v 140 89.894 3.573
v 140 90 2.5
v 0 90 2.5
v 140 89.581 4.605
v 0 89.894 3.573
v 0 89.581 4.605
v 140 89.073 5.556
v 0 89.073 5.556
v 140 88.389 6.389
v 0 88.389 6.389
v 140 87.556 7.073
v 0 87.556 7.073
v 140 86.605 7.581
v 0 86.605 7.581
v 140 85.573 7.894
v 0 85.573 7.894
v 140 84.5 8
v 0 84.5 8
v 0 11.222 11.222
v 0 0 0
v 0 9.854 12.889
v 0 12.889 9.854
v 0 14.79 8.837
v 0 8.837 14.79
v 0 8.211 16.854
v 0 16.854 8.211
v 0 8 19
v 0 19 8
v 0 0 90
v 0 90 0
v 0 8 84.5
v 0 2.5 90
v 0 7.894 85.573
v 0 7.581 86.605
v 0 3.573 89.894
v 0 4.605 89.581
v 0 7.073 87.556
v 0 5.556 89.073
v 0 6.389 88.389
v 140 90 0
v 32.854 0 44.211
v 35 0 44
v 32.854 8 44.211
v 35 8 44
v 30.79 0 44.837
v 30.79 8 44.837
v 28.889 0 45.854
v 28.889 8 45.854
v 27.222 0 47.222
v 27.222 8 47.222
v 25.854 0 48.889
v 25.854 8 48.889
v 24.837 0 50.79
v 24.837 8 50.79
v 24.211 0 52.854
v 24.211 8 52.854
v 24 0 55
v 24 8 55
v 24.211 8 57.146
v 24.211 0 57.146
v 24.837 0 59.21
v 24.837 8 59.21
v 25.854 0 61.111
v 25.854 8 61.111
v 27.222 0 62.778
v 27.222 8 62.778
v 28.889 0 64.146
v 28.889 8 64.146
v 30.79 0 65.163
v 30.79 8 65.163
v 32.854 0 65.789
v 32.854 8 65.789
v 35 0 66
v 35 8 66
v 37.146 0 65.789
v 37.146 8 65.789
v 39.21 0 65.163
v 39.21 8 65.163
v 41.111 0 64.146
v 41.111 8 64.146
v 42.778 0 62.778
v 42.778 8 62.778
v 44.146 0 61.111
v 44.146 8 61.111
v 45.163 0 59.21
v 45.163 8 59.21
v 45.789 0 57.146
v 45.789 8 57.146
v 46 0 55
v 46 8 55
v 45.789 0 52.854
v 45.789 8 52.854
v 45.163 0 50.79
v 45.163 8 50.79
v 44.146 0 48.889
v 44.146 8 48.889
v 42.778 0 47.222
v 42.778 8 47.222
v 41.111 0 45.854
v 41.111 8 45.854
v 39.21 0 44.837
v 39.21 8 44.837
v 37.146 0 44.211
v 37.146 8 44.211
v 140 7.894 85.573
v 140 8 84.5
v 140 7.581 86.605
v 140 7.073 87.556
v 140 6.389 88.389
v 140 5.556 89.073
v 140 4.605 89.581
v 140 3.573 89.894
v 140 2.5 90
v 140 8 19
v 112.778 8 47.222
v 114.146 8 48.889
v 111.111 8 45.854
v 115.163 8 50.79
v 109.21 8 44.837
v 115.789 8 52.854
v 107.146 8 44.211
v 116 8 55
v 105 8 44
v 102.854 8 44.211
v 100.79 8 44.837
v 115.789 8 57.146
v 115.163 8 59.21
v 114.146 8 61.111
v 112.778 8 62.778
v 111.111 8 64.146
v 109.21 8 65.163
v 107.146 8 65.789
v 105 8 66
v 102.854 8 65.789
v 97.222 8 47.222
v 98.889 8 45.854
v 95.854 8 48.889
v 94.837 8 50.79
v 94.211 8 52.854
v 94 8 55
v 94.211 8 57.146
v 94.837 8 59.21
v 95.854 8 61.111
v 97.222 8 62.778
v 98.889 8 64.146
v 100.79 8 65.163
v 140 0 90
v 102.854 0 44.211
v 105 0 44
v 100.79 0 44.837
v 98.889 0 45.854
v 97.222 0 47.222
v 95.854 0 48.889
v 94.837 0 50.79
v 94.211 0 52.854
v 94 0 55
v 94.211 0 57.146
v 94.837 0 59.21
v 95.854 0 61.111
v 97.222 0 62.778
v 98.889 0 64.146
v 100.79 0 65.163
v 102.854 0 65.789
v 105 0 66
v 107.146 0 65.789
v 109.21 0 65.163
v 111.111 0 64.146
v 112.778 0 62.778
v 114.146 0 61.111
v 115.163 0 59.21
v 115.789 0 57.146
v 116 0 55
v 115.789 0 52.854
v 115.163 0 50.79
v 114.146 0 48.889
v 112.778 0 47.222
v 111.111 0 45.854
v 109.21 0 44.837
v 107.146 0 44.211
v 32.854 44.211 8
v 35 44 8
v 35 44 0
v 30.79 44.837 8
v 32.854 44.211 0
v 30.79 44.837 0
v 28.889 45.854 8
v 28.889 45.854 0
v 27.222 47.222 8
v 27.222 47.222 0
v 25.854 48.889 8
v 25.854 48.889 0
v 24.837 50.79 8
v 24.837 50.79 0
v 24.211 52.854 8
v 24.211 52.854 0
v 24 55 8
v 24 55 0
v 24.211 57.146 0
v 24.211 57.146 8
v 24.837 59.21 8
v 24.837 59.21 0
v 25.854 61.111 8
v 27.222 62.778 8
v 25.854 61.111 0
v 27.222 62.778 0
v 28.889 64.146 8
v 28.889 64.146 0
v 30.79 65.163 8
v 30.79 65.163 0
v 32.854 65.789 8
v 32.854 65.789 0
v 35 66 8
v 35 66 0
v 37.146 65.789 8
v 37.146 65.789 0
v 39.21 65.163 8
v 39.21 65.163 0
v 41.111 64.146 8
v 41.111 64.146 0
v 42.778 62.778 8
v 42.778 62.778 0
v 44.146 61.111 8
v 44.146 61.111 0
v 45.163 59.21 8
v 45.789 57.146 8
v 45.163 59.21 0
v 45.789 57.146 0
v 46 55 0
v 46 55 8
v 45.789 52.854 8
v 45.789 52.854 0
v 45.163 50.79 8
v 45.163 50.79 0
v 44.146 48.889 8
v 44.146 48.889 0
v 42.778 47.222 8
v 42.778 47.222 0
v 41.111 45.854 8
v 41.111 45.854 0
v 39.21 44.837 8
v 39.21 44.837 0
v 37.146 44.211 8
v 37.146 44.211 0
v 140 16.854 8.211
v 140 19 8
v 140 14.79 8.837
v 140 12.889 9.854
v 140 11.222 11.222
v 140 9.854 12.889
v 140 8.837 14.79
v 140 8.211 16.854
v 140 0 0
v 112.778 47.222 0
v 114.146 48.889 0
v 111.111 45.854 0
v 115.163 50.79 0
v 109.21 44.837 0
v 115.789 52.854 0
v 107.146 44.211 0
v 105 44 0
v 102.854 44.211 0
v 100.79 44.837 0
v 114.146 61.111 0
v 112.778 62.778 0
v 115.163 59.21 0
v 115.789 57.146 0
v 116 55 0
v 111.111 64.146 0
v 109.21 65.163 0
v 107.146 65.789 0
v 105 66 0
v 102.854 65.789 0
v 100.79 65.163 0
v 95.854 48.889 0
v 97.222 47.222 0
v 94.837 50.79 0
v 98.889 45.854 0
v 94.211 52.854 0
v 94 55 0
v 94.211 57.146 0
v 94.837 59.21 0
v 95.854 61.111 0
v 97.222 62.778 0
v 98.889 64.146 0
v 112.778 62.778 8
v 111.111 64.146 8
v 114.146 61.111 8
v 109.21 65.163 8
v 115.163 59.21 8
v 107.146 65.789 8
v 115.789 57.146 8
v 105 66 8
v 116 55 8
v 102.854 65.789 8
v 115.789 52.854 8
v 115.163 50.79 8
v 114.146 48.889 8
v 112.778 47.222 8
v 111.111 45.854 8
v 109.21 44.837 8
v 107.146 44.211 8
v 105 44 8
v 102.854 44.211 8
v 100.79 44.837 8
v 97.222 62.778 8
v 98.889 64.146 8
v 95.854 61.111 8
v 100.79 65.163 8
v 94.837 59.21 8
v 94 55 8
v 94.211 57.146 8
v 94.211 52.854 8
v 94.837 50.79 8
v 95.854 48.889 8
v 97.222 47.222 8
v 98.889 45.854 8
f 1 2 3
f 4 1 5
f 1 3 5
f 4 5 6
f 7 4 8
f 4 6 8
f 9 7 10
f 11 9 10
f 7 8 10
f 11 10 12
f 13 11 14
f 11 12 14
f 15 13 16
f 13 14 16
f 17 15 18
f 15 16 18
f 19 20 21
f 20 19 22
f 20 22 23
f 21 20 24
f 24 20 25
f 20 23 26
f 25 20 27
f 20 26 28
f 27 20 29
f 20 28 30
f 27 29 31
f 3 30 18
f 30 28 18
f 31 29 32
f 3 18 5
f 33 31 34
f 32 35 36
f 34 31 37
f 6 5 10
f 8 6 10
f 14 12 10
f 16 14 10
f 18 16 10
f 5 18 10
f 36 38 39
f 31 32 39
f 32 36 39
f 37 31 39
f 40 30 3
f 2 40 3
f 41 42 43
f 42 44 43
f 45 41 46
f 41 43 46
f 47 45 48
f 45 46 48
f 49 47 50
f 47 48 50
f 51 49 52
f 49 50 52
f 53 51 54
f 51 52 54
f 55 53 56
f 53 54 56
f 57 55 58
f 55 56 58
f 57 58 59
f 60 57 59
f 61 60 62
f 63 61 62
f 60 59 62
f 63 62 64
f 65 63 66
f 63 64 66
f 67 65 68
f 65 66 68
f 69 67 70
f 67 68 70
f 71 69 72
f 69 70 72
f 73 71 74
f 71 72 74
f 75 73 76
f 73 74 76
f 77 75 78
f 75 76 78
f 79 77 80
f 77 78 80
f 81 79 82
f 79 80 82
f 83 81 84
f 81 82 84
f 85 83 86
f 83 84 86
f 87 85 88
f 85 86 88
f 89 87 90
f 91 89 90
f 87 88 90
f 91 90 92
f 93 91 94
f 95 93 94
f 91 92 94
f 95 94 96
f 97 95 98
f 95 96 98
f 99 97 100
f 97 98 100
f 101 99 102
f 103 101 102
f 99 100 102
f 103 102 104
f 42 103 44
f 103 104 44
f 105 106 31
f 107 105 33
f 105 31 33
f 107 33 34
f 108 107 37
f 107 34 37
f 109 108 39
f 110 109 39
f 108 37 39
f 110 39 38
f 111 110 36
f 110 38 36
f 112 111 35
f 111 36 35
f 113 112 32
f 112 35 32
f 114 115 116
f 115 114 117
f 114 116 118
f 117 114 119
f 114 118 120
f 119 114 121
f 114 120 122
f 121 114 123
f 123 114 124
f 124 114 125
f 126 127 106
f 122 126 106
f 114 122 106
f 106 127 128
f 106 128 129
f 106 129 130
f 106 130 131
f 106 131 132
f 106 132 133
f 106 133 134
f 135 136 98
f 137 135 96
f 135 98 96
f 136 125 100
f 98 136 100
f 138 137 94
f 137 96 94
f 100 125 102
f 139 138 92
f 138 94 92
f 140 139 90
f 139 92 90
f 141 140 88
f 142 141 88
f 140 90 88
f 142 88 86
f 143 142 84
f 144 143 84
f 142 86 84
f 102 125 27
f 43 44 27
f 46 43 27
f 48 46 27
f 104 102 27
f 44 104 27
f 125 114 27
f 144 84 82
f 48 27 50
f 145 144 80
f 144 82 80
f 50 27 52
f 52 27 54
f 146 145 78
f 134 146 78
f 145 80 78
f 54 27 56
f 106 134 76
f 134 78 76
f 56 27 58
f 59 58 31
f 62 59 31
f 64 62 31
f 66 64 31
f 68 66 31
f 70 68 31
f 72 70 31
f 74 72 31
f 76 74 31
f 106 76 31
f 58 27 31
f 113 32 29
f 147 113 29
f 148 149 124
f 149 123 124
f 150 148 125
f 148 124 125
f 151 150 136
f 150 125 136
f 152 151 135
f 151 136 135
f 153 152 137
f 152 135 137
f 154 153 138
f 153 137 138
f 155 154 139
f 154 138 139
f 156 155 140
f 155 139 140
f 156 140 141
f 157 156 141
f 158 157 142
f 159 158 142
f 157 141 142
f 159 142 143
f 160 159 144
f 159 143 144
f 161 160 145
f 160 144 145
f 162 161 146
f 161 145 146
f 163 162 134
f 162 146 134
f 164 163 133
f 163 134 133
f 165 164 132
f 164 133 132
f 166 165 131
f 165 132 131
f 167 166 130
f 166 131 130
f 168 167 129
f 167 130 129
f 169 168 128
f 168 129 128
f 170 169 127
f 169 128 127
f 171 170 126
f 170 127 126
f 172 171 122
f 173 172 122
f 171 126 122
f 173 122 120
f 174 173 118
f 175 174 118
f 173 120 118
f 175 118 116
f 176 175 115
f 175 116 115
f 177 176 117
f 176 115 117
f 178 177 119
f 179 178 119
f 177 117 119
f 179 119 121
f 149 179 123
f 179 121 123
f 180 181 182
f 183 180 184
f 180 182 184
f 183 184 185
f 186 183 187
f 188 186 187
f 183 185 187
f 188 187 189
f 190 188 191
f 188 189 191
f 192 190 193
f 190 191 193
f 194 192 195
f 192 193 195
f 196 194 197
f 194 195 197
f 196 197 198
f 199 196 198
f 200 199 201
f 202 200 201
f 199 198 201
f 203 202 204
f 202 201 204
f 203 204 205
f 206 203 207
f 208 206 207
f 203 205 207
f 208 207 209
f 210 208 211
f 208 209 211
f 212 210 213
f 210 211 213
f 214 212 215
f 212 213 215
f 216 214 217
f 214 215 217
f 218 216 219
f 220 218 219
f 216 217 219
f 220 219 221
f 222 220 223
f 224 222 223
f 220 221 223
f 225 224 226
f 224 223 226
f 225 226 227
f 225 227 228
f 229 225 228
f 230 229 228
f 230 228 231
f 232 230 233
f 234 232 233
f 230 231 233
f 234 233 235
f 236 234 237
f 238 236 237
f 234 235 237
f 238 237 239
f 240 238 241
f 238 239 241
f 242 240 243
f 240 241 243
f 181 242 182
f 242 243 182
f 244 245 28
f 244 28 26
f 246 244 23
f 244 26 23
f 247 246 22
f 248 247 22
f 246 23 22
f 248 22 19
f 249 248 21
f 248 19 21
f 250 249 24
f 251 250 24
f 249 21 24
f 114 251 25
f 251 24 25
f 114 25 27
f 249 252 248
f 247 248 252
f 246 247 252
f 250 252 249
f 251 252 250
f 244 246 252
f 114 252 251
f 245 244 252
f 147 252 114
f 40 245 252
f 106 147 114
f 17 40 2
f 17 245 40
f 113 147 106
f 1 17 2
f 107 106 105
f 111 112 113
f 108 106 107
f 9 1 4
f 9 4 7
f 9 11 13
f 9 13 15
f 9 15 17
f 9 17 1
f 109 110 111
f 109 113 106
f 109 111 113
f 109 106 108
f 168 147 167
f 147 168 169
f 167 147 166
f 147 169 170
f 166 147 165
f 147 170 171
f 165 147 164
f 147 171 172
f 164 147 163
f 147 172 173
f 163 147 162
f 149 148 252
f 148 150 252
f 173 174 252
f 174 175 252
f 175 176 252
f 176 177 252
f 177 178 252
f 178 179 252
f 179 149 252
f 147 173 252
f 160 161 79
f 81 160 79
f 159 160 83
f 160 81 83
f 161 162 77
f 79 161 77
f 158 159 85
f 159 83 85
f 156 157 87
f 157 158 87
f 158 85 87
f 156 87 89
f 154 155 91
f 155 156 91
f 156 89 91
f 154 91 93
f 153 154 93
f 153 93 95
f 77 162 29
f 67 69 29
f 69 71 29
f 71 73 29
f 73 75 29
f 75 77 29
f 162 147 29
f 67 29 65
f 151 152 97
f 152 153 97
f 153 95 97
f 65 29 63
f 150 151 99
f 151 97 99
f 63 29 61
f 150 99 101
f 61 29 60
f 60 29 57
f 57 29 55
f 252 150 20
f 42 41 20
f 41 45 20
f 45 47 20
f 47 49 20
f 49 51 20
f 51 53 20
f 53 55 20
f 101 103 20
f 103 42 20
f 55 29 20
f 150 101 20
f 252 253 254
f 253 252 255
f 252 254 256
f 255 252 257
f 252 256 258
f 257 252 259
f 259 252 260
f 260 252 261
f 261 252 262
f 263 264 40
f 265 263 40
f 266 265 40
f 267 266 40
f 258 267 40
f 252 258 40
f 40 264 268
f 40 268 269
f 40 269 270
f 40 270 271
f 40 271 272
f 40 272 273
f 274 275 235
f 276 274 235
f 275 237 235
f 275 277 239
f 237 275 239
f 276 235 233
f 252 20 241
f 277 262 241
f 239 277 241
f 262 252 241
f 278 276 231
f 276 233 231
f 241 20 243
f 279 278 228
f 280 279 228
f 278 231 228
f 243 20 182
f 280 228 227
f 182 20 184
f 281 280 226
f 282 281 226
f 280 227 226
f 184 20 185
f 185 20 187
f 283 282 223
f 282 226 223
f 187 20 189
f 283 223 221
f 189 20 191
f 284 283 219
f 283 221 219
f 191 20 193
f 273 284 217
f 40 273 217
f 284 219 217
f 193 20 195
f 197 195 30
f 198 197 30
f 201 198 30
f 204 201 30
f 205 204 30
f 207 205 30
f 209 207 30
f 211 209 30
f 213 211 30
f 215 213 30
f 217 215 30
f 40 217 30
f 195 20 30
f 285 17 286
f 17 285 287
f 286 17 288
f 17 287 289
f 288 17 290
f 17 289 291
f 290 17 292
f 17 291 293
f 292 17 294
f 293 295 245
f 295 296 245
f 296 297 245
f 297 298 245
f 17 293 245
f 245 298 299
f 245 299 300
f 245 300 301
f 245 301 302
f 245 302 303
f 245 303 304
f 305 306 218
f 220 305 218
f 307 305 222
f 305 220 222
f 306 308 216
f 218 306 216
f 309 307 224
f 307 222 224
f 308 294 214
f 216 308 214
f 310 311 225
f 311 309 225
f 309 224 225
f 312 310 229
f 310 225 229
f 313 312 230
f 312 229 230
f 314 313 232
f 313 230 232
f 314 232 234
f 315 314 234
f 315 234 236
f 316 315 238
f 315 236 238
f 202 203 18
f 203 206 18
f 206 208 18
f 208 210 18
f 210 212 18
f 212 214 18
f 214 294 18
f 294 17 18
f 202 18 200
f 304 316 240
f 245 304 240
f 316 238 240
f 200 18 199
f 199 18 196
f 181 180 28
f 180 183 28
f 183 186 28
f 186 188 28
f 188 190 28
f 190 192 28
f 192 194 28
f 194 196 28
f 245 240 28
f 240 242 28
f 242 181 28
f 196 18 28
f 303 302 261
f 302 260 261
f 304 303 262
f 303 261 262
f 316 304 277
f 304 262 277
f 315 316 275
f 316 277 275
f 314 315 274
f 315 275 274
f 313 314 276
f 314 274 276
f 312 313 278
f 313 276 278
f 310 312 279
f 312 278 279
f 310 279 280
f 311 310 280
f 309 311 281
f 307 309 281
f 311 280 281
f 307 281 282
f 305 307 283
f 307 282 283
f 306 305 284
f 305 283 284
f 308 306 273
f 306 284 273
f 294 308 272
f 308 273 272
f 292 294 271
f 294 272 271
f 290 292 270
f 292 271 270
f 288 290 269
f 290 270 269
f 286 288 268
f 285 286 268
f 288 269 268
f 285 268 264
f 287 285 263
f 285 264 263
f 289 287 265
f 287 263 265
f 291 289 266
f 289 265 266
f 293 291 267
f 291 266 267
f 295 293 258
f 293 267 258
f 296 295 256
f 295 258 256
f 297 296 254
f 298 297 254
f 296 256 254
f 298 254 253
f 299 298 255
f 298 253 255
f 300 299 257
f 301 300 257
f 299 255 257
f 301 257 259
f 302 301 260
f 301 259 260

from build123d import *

# Parameters (mm, degrees)
ANGLES_EQUAL_90_X_90_X_8_1_DEPTH = 140
SKETCH12_R                       = 11
CUT_EXTRUDE1_DEPTH               = 190.208879284
LPATTERN1_COUNT                  = 2
LPATTERN1_PITCH                  = 70
CIRPATTERN4_COUNT                = 2
CIRPATTERN4_ANGLE                = 90
CIRPATTERN4_COPY_1_SKETCH_R      = 11
CIRPATTERN4_COPY_1_DEPTH         = 190.208879284


with BuildPart() as part:
    # Sketch11 → Angles equal 90 X 90 X 8(1) (new body)
    with BuildSketch(Plane(origin=(0, 45, 45), x_dir=(0, 1, 0), z_dir=(1, 0, 0))):
        with BuildLine():
            Line((-45, 45), (-45, -45))
            Line((-45, -45), (45, -45))
            Line((45, -45), (45, -42.5))
            ThreePointArc((45, -42.5), (43.389087297, -38.610912703), (39.5, -37))
            Line((39.5, -37), (-26, -37))
            ThreePointArc((-26, -37), (-33.778174593, -33.778174593), (-37, -26))
            Line((-37, -26), (-37, 39.5))
            ThreePointArc((-37, 39.5), (-38.610912703, 43.389087297), (-42.5, 45))
            Line((-42.5, 45), (-45, 45))
        make_face()
    extrude(amount=ANGLES_EQUAL_90_X_90_X_8_1_DEPTH)

    # Sketch12 → Cut-Extrude1 (cut, symmetric)
    with BuildSketch(Plane(origin=(0, 0, 0), x_dir=(1, 0, 0), z_dir=(0, 1, 0))):
        with Locations(Location((35, -55, 0), (0, 0, 90))):
            Circle(SKETCH12_R)
    cut_extrude1 = extrude(amount=CUT_EXTRUDE1_DEPTH, both=True, mode=Mode.SUBTRACT)

    # LPattern1: Cut-Extrude1 ×2
    with Locations(*[(i * LPATTERN1_PITCH, 0, 0) for i in range(1, LPATTERN1_COUNT)]):
        add(cut_extrude1, mode=Mode.SUBTRACT)

    # CirPattern4: Cut-Extrude1 ×2 about axis
    cirpattern4_axis = Axis((-18.99, 0, 0), (-1, 0, 0))
    for i in range(1, CIRPATTERN4_COUNT):
        add(cut_extrude1.rotate(cirpattern4_axis, i * CIRPATTERN4_ANGLE / (CIRPATTERN4_COUNT - 1)), mode=Mode.SUBTRACT)

    # CirPattern4 copy 1 sketch → CirPattern4 copy 1 (cut, symmetric)
    with BuildSketch(Plane(origin=(70, 0, 0), x_dir=(1, 0, 0), z_dir=(0, 0, -1))):
        with Locations(Location((35, -55, 0), (0, 0, 90))):
            Circle(CIRPATTERN4_COPY_1_SKETCH_R)
    extrude(amount=CIRPATTERN4_COPY_1_DEPTH, both=True, mode=Mode.SUBTRACT)


solid = part.part
